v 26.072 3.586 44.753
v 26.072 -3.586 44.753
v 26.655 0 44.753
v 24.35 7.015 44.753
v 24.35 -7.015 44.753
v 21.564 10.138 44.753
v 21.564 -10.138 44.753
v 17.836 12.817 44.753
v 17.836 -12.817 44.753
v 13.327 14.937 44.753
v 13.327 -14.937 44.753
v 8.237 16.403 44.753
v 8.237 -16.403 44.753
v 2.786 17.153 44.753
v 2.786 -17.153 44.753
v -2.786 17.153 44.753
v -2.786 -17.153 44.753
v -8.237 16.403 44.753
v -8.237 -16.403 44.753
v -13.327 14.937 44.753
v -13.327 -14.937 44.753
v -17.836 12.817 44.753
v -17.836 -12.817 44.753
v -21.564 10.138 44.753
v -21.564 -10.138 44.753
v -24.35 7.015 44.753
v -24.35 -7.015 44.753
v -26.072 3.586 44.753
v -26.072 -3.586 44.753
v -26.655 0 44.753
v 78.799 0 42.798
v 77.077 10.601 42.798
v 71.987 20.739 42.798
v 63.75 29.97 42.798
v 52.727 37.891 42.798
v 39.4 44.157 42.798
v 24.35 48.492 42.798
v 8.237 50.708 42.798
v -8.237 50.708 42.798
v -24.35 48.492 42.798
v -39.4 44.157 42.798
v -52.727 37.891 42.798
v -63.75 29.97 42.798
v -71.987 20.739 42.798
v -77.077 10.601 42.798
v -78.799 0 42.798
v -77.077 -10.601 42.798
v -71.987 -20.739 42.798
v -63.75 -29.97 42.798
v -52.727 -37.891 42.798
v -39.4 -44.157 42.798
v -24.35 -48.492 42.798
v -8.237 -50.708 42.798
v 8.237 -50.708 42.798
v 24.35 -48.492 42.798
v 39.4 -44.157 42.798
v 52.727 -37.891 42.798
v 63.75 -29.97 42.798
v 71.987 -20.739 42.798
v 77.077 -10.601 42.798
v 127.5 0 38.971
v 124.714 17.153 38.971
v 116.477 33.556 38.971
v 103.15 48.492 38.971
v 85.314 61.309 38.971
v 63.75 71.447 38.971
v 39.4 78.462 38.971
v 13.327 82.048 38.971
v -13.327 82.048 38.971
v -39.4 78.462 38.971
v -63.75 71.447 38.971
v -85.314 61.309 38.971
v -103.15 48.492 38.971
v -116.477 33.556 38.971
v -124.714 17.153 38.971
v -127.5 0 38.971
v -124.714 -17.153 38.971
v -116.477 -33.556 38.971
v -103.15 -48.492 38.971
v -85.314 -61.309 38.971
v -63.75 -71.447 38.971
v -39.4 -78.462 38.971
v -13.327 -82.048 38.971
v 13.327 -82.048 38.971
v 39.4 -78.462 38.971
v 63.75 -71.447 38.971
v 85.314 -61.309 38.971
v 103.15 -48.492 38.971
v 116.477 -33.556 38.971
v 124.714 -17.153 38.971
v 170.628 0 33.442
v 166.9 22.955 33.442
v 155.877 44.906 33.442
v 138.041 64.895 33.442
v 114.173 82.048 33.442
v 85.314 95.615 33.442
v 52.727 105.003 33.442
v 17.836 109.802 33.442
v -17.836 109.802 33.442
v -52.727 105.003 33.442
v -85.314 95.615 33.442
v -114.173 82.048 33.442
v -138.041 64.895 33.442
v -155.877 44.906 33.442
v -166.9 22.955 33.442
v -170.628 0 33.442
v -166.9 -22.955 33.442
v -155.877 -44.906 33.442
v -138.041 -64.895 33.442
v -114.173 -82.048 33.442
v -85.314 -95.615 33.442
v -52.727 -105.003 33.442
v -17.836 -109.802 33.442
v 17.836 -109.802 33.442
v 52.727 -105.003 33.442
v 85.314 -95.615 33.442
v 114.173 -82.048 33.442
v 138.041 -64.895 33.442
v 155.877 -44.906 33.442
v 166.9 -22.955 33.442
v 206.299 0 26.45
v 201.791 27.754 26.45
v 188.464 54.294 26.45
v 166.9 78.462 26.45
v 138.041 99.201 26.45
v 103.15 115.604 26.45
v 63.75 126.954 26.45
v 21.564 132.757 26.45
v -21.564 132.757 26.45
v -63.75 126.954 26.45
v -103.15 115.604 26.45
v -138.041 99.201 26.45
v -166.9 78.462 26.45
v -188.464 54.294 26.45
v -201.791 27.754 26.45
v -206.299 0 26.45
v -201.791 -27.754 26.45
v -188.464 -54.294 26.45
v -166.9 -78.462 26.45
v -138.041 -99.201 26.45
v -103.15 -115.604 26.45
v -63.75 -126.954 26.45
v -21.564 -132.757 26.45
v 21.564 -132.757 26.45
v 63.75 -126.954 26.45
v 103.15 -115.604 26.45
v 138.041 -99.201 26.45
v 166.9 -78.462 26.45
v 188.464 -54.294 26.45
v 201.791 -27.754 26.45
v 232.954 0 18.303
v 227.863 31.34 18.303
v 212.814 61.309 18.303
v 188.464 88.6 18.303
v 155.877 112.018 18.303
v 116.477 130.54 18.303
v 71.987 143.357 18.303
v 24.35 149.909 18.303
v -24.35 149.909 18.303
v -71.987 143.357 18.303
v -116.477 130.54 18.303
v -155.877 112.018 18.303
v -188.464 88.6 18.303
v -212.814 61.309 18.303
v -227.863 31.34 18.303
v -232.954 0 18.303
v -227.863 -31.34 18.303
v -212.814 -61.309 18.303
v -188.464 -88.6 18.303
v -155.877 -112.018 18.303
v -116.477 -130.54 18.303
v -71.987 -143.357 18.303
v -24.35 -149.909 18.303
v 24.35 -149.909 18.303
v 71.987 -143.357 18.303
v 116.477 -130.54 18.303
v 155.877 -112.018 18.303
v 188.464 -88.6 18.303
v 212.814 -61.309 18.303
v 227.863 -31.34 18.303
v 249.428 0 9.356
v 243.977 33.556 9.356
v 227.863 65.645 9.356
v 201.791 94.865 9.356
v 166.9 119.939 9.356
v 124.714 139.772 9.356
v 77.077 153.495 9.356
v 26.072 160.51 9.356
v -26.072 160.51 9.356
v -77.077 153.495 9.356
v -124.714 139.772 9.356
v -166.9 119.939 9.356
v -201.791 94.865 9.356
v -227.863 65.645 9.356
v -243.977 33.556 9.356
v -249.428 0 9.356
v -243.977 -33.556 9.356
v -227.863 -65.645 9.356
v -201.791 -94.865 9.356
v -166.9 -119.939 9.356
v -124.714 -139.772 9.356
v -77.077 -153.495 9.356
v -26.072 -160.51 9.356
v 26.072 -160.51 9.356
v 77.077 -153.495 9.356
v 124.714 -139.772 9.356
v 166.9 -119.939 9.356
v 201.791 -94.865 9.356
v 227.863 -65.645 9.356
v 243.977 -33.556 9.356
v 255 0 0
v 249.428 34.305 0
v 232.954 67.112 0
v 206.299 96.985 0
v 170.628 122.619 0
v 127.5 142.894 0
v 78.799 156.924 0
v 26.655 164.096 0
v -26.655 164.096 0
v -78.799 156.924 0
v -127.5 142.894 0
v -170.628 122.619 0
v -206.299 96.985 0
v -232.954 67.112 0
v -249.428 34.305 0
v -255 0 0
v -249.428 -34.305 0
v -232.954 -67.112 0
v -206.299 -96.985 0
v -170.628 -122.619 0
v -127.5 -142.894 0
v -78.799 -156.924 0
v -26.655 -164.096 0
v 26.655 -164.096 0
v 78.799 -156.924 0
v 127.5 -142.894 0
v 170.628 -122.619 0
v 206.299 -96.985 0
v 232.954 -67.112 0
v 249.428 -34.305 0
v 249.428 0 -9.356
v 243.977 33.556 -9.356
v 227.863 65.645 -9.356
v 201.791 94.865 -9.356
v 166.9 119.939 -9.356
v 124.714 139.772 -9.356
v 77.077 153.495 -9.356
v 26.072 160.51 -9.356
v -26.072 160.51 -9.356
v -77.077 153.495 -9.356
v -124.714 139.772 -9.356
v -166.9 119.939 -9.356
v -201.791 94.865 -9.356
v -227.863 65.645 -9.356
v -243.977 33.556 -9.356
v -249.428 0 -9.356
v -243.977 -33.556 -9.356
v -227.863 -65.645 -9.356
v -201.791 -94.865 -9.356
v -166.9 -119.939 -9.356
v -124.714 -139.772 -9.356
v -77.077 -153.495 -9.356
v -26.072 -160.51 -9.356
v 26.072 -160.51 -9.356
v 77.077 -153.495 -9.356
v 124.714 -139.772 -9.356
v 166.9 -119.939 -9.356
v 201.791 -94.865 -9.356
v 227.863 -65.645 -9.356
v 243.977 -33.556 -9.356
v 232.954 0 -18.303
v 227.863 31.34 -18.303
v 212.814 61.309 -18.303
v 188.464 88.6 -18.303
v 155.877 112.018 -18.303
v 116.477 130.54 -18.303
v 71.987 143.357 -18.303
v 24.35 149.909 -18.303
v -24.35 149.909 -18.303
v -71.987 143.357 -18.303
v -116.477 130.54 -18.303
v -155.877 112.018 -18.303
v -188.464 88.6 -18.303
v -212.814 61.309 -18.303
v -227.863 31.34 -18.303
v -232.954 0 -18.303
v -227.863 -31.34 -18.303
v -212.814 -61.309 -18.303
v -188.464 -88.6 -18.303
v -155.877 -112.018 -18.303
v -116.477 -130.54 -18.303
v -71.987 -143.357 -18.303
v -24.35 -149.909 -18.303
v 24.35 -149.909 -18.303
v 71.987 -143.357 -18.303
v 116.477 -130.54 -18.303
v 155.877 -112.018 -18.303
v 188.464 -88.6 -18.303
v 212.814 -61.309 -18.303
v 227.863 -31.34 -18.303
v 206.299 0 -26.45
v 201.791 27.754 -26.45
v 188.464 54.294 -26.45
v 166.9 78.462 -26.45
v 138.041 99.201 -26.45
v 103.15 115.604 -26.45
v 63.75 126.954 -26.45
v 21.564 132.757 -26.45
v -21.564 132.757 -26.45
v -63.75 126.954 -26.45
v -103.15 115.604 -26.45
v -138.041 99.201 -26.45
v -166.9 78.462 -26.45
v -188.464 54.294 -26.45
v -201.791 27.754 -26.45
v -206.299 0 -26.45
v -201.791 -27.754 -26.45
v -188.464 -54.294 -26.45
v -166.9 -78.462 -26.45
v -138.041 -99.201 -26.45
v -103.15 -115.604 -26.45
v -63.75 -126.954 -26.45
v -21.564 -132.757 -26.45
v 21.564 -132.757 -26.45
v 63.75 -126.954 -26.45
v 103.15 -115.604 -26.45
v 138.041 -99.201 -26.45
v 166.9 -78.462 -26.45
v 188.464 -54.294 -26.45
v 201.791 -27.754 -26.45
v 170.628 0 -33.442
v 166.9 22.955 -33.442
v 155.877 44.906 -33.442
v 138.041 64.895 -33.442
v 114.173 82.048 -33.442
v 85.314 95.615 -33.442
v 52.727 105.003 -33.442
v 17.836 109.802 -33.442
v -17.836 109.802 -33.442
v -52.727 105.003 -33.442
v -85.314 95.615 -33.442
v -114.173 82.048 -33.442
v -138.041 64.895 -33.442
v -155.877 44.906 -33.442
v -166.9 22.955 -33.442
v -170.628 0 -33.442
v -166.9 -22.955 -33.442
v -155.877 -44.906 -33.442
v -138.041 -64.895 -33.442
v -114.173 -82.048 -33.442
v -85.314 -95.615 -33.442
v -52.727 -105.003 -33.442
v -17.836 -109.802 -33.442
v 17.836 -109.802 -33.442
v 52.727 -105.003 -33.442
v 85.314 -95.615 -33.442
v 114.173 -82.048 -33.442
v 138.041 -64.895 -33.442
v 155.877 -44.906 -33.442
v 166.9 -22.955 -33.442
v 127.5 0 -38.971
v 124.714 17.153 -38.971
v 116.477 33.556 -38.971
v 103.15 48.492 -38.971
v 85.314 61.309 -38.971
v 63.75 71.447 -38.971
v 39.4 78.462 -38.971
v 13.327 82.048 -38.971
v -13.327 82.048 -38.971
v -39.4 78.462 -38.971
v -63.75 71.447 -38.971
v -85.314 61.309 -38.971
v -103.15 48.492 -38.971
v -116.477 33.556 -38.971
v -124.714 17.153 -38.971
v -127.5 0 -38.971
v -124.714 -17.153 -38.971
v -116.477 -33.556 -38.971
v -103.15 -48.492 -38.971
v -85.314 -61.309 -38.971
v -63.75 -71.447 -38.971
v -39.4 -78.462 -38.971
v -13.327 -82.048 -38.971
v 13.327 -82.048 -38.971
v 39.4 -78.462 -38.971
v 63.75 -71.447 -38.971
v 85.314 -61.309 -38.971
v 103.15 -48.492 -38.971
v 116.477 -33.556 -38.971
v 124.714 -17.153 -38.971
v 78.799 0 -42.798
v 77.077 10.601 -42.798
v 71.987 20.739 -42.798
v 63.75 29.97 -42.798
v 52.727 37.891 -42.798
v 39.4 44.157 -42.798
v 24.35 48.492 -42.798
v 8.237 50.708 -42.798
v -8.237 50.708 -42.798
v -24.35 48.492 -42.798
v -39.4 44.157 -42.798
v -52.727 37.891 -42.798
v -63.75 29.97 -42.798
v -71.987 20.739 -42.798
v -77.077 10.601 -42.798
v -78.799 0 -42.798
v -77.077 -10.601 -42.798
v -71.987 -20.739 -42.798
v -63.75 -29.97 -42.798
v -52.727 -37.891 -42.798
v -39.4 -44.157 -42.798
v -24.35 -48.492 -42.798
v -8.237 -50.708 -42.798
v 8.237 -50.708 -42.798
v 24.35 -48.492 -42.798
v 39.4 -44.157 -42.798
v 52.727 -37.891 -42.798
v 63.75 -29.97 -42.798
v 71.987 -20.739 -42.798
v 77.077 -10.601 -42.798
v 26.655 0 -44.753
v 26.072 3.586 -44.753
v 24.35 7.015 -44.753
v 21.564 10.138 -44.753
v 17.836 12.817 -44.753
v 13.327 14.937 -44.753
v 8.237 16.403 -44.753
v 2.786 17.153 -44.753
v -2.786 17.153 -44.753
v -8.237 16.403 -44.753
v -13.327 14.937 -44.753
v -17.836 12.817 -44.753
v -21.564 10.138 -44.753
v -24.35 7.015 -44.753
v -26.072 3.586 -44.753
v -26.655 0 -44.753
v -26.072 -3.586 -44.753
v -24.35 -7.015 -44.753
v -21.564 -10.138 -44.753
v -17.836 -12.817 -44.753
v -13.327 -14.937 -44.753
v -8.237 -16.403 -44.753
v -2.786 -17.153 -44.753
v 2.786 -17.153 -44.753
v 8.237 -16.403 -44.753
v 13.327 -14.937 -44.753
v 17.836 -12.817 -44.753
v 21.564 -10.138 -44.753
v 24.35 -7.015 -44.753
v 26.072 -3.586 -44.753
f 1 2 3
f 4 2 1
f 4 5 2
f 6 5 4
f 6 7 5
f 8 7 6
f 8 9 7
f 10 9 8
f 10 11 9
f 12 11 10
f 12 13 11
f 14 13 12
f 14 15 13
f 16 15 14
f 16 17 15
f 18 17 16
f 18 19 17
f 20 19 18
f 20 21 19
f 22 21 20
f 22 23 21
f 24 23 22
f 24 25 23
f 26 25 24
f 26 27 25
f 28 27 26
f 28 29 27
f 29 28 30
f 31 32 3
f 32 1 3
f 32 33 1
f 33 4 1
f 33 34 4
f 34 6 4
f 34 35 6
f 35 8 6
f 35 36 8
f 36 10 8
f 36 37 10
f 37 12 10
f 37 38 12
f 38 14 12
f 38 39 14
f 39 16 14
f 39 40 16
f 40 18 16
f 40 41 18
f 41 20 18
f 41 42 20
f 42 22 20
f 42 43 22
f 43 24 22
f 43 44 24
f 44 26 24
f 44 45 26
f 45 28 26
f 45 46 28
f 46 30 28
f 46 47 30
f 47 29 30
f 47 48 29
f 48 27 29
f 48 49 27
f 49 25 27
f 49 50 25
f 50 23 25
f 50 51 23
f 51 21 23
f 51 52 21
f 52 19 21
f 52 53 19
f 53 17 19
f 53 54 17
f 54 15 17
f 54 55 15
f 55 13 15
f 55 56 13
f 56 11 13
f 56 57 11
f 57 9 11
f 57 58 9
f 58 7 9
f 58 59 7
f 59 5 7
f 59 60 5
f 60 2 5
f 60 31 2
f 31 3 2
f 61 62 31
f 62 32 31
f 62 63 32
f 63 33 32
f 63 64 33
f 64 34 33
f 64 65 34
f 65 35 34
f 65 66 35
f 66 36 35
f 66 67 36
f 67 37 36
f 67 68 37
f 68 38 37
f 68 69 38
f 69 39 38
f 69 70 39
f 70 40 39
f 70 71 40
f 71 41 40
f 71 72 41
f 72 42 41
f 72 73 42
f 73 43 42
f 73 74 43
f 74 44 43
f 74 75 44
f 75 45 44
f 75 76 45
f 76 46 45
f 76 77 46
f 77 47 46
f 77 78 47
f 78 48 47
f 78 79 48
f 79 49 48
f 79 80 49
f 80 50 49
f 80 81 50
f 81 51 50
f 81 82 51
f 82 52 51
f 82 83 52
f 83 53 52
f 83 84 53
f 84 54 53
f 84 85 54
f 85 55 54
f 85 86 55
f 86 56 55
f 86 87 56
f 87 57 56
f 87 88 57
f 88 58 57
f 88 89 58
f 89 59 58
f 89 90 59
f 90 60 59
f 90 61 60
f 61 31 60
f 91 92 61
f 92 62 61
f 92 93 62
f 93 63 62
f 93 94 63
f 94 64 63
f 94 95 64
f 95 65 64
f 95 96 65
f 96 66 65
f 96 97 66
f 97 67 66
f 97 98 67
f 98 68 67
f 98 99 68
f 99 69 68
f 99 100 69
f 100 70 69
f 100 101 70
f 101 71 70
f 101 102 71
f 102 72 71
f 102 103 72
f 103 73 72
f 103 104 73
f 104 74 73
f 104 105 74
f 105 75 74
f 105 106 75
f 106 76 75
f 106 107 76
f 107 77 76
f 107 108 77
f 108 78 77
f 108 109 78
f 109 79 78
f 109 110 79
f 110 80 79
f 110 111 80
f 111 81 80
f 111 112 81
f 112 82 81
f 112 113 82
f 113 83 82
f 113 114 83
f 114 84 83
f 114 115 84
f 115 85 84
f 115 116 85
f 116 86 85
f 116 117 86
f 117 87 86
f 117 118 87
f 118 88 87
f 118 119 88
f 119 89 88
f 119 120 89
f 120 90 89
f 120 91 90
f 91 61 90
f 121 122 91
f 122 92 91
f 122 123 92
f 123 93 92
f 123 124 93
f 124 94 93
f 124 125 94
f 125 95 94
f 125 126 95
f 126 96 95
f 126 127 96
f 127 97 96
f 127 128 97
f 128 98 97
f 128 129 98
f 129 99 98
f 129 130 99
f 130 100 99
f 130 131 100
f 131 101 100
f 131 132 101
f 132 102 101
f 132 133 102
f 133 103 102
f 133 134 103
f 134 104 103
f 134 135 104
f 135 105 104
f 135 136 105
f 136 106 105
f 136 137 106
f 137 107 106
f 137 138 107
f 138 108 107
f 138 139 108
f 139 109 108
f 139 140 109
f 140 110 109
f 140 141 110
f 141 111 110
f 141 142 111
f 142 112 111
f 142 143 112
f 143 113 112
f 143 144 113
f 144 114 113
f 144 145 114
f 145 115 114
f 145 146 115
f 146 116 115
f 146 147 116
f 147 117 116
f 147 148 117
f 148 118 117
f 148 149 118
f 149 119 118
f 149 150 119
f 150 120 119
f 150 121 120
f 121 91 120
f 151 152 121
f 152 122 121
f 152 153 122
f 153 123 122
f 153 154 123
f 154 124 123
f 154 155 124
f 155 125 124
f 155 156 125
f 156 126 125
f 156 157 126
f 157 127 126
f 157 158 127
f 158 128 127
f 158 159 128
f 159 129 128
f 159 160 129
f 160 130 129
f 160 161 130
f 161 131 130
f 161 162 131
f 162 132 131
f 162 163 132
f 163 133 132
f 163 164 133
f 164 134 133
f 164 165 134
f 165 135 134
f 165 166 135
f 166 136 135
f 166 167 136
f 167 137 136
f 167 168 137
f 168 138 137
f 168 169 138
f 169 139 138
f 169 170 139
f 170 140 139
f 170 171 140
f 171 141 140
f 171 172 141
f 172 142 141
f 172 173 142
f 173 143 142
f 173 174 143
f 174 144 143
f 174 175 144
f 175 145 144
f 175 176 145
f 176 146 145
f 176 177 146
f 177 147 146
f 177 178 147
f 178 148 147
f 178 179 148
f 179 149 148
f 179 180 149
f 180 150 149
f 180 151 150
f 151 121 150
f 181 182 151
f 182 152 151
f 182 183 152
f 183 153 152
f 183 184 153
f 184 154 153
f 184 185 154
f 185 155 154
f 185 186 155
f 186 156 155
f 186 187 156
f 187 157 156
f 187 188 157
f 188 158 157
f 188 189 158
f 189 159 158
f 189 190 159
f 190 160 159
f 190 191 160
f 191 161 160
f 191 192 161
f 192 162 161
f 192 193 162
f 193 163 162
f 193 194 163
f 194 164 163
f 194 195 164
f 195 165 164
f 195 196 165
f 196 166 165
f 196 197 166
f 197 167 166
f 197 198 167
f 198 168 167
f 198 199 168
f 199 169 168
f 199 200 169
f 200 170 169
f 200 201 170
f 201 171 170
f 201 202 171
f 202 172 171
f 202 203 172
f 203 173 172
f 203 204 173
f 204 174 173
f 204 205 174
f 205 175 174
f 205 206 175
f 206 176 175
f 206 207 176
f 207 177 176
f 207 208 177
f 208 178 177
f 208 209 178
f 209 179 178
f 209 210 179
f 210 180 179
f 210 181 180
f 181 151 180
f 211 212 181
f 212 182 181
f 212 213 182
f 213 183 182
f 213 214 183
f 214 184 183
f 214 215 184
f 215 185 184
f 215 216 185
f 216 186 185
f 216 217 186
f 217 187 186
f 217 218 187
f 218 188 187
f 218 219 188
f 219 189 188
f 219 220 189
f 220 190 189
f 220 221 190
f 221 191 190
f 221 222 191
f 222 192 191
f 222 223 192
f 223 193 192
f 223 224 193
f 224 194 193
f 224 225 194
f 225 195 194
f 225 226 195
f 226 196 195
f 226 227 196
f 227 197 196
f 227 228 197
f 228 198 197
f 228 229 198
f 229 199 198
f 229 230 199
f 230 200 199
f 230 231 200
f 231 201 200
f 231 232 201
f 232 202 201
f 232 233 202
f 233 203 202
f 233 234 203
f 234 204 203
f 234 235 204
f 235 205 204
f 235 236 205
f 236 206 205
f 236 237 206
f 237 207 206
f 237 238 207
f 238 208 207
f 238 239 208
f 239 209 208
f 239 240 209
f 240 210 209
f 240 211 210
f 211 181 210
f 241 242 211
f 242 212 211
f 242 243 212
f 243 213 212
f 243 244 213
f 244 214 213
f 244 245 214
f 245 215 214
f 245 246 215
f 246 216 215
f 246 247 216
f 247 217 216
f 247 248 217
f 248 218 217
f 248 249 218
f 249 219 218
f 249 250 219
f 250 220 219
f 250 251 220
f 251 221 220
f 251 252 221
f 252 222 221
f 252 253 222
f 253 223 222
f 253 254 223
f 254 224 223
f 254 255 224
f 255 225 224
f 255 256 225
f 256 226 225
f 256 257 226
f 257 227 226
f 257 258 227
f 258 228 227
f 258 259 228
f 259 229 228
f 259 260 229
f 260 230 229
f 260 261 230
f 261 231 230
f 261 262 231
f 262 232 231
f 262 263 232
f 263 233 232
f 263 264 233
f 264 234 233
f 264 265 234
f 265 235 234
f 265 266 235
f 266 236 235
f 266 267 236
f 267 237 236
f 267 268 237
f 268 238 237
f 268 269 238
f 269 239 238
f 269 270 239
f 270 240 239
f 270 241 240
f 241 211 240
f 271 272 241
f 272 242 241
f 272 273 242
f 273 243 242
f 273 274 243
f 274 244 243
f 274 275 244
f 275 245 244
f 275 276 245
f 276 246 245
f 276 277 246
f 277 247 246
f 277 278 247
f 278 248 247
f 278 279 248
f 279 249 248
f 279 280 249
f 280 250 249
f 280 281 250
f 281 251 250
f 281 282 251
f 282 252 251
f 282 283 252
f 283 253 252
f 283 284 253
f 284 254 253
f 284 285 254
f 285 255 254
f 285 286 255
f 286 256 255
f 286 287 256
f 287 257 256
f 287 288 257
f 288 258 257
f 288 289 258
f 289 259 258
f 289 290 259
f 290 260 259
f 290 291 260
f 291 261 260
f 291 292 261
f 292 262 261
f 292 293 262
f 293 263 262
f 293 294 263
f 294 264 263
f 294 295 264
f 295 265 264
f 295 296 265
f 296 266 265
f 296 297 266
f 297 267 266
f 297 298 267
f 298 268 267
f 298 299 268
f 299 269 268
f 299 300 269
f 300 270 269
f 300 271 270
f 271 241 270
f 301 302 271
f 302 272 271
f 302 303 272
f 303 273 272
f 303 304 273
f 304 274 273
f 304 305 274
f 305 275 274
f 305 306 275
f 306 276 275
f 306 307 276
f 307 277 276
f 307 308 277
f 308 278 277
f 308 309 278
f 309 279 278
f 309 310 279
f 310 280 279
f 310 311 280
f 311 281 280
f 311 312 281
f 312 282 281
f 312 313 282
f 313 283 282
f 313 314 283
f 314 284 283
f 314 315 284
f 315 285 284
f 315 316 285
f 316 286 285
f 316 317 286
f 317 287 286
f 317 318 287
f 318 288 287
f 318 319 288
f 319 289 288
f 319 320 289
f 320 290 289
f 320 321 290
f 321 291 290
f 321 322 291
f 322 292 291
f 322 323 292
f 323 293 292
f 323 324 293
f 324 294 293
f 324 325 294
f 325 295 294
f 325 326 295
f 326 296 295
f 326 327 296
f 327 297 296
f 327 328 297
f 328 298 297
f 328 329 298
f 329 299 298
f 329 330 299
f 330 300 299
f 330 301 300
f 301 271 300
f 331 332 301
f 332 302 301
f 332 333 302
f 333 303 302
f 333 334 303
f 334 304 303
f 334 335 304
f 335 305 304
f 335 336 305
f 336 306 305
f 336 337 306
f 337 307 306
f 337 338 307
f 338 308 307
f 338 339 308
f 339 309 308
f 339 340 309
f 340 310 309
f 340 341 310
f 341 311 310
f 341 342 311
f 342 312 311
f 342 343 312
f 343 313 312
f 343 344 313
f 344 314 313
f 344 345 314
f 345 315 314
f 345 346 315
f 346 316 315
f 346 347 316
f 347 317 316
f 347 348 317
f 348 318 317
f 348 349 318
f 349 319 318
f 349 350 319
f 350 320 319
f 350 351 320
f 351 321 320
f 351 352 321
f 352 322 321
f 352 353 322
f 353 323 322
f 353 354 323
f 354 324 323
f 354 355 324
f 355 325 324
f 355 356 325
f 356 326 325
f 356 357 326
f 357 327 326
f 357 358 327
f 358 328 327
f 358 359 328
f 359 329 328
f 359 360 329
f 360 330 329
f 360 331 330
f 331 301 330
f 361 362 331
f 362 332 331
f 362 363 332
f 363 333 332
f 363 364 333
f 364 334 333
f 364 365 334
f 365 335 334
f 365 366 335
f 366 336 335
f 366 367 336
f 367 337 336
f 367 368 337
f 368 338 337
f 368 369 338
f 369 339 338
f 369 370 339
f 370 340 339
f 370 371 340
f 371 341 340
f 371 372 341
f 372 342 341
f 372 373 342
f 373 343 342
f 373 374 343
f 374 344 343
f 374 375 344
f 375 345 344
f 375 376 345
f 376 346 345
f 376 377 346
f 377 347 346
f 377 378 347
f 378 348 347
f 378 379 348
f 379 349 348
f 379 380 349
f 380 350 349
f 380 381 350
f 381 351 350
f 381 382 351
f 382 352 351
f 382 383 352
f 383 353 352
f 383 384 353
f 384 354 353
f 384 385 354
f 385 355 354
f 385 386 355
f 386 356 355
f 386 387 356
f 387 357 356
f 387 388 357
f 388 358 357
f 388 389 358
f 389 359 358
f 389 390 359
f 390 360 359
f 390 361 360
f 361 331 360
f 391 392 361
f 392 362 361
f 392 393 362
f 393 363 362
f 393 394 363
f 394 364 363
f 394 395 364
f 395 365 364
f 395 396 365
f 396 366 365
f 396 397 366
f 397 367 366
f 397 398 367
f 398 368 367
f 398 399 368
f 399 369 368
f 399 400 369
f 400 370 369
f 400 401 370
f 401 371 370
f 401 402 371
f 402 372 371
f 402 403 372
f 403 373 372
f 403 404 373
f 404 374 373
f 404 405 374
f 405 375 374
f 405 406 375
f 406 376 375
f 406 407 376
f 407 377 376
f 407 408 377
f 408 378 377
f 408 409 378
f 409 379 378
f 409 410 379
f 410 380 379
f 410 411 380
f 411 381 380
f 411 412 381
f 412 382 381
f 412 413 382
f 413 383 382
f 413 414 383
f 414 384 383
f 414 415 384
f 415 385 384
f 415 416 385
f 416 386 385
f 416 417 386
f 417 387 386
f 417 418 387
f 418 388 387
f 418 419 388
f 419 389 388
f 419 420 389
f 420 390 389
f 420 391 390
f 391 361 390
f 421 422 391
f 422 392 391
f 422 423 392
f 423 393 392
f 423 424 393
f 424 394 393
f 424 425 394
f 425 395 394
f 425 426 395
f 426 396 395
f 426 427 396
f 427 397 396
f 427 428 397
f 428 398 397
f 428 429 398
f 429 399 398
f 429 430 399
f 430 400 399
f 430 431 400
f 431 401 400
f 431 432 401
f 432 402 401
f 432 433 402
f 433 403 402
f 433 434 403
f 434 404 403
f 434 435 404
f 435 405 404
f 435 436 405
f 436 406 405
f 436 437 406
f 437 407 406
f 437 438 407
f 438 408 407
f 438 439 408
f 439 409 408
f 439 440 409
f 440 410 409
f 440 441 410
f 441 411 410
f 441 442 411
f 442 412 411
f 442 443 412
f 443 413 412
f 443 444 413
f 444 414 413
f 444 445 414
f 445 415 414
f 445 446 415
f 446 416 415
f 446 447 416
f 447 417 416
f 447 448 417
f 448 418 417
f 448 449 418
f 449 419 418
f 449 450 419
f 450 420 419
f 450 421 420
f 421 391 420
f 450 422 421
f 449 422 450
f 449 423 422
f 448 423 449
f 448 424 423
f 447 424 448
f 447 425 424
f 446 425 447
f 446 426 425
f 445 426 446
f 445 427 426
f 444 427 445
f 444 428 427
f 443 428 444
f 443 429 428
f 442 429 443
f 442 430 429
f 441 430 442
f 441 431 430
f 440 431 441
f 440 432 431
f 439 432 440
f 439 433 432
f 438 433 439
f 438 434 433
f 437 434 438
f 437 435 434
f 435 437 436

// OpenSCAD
// Generated by SolidPython 1.0.1 on 2020-07-29 00:46:53


scale(v = [17, 11, 3]) {
	sphere(r = 15);
}
/***********************************************
*********      SolidPython code:      **********
************************************************
 
# import packages: SolidPython
from solid import *
from solid.utils import *
from itertools import chain, combinations, permutations


class Resize:

    def __init__(self, scad_file):
        self.scad_file = scad_file
        #self.scad_file = import_scad(scad_file)
        # cone/cylinder param:
        self.r1 = 0
        self.r2 = 0
        self.h = 0
        # rectangular prism param:
        self.w = 0
        self.l = 0
        # ellipse param:
        self.r = 0

    # import OpenScad code (file name corresponds to shape)


    # classify shape + parameters
    def assign(self, param1, param2, param3):
        if self.scad_file == 'cone.scad':
            self.r1 = param1
            self.r2 = param2
            self.h = param3
        elif self.scad_file == 'cylinder.scad':
            self.r1 = param1
            self.r2 = param2
            self.h = param3
        elif self.scad_file == 'rectangularPrism.scad':
            self.h = param1
            self.l = param2
            self.w = param3
        else:
            self.r = param1
            self.h = param2

    # resize parameters
    def iterate(self):
        x = range(3, 20, 2)
        i = 1
        if self.scad_file == 'cone.scad':
            tempList = list(permutations(x, 2))
            for temp in tempList:
                param1 = temp[0]
                param2 = temp[1]
                filepath = 'produced_scad_files/' + 'cone' + str(param1) + '_' + str(param2) + '_' + '.scad'
                scad_render_to_file(cylinder(h=param1, r1=param2, r2=0), filepath)

        elif self.scad_file == 'cylinder.scad':
            tempList = list(permutations(x, 3))
            for temp in tempList:
                param1 = temp[0]
                param2 = temp[1]
                filepath = 'produced_scad_files/' + 'cylinder' + str(param1) + '_' + str(param2) + '_' + '.scad'
                scad_render_to_file(cylinder(h=param1, r1=param2, r2=param2), filepath)

        elif self.scad_file == 'rectangularPrism.scad':
            tempList = list(permutations(x, 3))
            for temp in tempList:
                param1 = temp[0]
                param2 = temp[1]
                param3 = temp[2]
                filepath = 'produced_scad_files/' + 'rectangularPrism' + str(param1) + '_' + str(param2) + '_' + str(
                    param3) + '.scad'
                scad_render_to_file(cube(size=(param1, param2, param3)), filepath)

        elif self.scad_file == 'ellipse.scad':
            tempList = list(permutations(x, 4))
            for temp in tempList:
                param1 = temp[0]
                param2 = temp[1]
                param3 = temp[2]
                param4 = temp[3]
                filepath = 'produced_scad_files/' + 'ellipse' + str(param1) + '_' + str(param2) + '_' + str(param3) + '_' + str(param4) + '.scad'
                scad_render_to_file(scale([param1, param2, param3])(sphere(r=param4)), filepath)

    def render_to_scadfile(self):
        scad_render_to_file(scad, 'example.scad') 
 
************************************************/
